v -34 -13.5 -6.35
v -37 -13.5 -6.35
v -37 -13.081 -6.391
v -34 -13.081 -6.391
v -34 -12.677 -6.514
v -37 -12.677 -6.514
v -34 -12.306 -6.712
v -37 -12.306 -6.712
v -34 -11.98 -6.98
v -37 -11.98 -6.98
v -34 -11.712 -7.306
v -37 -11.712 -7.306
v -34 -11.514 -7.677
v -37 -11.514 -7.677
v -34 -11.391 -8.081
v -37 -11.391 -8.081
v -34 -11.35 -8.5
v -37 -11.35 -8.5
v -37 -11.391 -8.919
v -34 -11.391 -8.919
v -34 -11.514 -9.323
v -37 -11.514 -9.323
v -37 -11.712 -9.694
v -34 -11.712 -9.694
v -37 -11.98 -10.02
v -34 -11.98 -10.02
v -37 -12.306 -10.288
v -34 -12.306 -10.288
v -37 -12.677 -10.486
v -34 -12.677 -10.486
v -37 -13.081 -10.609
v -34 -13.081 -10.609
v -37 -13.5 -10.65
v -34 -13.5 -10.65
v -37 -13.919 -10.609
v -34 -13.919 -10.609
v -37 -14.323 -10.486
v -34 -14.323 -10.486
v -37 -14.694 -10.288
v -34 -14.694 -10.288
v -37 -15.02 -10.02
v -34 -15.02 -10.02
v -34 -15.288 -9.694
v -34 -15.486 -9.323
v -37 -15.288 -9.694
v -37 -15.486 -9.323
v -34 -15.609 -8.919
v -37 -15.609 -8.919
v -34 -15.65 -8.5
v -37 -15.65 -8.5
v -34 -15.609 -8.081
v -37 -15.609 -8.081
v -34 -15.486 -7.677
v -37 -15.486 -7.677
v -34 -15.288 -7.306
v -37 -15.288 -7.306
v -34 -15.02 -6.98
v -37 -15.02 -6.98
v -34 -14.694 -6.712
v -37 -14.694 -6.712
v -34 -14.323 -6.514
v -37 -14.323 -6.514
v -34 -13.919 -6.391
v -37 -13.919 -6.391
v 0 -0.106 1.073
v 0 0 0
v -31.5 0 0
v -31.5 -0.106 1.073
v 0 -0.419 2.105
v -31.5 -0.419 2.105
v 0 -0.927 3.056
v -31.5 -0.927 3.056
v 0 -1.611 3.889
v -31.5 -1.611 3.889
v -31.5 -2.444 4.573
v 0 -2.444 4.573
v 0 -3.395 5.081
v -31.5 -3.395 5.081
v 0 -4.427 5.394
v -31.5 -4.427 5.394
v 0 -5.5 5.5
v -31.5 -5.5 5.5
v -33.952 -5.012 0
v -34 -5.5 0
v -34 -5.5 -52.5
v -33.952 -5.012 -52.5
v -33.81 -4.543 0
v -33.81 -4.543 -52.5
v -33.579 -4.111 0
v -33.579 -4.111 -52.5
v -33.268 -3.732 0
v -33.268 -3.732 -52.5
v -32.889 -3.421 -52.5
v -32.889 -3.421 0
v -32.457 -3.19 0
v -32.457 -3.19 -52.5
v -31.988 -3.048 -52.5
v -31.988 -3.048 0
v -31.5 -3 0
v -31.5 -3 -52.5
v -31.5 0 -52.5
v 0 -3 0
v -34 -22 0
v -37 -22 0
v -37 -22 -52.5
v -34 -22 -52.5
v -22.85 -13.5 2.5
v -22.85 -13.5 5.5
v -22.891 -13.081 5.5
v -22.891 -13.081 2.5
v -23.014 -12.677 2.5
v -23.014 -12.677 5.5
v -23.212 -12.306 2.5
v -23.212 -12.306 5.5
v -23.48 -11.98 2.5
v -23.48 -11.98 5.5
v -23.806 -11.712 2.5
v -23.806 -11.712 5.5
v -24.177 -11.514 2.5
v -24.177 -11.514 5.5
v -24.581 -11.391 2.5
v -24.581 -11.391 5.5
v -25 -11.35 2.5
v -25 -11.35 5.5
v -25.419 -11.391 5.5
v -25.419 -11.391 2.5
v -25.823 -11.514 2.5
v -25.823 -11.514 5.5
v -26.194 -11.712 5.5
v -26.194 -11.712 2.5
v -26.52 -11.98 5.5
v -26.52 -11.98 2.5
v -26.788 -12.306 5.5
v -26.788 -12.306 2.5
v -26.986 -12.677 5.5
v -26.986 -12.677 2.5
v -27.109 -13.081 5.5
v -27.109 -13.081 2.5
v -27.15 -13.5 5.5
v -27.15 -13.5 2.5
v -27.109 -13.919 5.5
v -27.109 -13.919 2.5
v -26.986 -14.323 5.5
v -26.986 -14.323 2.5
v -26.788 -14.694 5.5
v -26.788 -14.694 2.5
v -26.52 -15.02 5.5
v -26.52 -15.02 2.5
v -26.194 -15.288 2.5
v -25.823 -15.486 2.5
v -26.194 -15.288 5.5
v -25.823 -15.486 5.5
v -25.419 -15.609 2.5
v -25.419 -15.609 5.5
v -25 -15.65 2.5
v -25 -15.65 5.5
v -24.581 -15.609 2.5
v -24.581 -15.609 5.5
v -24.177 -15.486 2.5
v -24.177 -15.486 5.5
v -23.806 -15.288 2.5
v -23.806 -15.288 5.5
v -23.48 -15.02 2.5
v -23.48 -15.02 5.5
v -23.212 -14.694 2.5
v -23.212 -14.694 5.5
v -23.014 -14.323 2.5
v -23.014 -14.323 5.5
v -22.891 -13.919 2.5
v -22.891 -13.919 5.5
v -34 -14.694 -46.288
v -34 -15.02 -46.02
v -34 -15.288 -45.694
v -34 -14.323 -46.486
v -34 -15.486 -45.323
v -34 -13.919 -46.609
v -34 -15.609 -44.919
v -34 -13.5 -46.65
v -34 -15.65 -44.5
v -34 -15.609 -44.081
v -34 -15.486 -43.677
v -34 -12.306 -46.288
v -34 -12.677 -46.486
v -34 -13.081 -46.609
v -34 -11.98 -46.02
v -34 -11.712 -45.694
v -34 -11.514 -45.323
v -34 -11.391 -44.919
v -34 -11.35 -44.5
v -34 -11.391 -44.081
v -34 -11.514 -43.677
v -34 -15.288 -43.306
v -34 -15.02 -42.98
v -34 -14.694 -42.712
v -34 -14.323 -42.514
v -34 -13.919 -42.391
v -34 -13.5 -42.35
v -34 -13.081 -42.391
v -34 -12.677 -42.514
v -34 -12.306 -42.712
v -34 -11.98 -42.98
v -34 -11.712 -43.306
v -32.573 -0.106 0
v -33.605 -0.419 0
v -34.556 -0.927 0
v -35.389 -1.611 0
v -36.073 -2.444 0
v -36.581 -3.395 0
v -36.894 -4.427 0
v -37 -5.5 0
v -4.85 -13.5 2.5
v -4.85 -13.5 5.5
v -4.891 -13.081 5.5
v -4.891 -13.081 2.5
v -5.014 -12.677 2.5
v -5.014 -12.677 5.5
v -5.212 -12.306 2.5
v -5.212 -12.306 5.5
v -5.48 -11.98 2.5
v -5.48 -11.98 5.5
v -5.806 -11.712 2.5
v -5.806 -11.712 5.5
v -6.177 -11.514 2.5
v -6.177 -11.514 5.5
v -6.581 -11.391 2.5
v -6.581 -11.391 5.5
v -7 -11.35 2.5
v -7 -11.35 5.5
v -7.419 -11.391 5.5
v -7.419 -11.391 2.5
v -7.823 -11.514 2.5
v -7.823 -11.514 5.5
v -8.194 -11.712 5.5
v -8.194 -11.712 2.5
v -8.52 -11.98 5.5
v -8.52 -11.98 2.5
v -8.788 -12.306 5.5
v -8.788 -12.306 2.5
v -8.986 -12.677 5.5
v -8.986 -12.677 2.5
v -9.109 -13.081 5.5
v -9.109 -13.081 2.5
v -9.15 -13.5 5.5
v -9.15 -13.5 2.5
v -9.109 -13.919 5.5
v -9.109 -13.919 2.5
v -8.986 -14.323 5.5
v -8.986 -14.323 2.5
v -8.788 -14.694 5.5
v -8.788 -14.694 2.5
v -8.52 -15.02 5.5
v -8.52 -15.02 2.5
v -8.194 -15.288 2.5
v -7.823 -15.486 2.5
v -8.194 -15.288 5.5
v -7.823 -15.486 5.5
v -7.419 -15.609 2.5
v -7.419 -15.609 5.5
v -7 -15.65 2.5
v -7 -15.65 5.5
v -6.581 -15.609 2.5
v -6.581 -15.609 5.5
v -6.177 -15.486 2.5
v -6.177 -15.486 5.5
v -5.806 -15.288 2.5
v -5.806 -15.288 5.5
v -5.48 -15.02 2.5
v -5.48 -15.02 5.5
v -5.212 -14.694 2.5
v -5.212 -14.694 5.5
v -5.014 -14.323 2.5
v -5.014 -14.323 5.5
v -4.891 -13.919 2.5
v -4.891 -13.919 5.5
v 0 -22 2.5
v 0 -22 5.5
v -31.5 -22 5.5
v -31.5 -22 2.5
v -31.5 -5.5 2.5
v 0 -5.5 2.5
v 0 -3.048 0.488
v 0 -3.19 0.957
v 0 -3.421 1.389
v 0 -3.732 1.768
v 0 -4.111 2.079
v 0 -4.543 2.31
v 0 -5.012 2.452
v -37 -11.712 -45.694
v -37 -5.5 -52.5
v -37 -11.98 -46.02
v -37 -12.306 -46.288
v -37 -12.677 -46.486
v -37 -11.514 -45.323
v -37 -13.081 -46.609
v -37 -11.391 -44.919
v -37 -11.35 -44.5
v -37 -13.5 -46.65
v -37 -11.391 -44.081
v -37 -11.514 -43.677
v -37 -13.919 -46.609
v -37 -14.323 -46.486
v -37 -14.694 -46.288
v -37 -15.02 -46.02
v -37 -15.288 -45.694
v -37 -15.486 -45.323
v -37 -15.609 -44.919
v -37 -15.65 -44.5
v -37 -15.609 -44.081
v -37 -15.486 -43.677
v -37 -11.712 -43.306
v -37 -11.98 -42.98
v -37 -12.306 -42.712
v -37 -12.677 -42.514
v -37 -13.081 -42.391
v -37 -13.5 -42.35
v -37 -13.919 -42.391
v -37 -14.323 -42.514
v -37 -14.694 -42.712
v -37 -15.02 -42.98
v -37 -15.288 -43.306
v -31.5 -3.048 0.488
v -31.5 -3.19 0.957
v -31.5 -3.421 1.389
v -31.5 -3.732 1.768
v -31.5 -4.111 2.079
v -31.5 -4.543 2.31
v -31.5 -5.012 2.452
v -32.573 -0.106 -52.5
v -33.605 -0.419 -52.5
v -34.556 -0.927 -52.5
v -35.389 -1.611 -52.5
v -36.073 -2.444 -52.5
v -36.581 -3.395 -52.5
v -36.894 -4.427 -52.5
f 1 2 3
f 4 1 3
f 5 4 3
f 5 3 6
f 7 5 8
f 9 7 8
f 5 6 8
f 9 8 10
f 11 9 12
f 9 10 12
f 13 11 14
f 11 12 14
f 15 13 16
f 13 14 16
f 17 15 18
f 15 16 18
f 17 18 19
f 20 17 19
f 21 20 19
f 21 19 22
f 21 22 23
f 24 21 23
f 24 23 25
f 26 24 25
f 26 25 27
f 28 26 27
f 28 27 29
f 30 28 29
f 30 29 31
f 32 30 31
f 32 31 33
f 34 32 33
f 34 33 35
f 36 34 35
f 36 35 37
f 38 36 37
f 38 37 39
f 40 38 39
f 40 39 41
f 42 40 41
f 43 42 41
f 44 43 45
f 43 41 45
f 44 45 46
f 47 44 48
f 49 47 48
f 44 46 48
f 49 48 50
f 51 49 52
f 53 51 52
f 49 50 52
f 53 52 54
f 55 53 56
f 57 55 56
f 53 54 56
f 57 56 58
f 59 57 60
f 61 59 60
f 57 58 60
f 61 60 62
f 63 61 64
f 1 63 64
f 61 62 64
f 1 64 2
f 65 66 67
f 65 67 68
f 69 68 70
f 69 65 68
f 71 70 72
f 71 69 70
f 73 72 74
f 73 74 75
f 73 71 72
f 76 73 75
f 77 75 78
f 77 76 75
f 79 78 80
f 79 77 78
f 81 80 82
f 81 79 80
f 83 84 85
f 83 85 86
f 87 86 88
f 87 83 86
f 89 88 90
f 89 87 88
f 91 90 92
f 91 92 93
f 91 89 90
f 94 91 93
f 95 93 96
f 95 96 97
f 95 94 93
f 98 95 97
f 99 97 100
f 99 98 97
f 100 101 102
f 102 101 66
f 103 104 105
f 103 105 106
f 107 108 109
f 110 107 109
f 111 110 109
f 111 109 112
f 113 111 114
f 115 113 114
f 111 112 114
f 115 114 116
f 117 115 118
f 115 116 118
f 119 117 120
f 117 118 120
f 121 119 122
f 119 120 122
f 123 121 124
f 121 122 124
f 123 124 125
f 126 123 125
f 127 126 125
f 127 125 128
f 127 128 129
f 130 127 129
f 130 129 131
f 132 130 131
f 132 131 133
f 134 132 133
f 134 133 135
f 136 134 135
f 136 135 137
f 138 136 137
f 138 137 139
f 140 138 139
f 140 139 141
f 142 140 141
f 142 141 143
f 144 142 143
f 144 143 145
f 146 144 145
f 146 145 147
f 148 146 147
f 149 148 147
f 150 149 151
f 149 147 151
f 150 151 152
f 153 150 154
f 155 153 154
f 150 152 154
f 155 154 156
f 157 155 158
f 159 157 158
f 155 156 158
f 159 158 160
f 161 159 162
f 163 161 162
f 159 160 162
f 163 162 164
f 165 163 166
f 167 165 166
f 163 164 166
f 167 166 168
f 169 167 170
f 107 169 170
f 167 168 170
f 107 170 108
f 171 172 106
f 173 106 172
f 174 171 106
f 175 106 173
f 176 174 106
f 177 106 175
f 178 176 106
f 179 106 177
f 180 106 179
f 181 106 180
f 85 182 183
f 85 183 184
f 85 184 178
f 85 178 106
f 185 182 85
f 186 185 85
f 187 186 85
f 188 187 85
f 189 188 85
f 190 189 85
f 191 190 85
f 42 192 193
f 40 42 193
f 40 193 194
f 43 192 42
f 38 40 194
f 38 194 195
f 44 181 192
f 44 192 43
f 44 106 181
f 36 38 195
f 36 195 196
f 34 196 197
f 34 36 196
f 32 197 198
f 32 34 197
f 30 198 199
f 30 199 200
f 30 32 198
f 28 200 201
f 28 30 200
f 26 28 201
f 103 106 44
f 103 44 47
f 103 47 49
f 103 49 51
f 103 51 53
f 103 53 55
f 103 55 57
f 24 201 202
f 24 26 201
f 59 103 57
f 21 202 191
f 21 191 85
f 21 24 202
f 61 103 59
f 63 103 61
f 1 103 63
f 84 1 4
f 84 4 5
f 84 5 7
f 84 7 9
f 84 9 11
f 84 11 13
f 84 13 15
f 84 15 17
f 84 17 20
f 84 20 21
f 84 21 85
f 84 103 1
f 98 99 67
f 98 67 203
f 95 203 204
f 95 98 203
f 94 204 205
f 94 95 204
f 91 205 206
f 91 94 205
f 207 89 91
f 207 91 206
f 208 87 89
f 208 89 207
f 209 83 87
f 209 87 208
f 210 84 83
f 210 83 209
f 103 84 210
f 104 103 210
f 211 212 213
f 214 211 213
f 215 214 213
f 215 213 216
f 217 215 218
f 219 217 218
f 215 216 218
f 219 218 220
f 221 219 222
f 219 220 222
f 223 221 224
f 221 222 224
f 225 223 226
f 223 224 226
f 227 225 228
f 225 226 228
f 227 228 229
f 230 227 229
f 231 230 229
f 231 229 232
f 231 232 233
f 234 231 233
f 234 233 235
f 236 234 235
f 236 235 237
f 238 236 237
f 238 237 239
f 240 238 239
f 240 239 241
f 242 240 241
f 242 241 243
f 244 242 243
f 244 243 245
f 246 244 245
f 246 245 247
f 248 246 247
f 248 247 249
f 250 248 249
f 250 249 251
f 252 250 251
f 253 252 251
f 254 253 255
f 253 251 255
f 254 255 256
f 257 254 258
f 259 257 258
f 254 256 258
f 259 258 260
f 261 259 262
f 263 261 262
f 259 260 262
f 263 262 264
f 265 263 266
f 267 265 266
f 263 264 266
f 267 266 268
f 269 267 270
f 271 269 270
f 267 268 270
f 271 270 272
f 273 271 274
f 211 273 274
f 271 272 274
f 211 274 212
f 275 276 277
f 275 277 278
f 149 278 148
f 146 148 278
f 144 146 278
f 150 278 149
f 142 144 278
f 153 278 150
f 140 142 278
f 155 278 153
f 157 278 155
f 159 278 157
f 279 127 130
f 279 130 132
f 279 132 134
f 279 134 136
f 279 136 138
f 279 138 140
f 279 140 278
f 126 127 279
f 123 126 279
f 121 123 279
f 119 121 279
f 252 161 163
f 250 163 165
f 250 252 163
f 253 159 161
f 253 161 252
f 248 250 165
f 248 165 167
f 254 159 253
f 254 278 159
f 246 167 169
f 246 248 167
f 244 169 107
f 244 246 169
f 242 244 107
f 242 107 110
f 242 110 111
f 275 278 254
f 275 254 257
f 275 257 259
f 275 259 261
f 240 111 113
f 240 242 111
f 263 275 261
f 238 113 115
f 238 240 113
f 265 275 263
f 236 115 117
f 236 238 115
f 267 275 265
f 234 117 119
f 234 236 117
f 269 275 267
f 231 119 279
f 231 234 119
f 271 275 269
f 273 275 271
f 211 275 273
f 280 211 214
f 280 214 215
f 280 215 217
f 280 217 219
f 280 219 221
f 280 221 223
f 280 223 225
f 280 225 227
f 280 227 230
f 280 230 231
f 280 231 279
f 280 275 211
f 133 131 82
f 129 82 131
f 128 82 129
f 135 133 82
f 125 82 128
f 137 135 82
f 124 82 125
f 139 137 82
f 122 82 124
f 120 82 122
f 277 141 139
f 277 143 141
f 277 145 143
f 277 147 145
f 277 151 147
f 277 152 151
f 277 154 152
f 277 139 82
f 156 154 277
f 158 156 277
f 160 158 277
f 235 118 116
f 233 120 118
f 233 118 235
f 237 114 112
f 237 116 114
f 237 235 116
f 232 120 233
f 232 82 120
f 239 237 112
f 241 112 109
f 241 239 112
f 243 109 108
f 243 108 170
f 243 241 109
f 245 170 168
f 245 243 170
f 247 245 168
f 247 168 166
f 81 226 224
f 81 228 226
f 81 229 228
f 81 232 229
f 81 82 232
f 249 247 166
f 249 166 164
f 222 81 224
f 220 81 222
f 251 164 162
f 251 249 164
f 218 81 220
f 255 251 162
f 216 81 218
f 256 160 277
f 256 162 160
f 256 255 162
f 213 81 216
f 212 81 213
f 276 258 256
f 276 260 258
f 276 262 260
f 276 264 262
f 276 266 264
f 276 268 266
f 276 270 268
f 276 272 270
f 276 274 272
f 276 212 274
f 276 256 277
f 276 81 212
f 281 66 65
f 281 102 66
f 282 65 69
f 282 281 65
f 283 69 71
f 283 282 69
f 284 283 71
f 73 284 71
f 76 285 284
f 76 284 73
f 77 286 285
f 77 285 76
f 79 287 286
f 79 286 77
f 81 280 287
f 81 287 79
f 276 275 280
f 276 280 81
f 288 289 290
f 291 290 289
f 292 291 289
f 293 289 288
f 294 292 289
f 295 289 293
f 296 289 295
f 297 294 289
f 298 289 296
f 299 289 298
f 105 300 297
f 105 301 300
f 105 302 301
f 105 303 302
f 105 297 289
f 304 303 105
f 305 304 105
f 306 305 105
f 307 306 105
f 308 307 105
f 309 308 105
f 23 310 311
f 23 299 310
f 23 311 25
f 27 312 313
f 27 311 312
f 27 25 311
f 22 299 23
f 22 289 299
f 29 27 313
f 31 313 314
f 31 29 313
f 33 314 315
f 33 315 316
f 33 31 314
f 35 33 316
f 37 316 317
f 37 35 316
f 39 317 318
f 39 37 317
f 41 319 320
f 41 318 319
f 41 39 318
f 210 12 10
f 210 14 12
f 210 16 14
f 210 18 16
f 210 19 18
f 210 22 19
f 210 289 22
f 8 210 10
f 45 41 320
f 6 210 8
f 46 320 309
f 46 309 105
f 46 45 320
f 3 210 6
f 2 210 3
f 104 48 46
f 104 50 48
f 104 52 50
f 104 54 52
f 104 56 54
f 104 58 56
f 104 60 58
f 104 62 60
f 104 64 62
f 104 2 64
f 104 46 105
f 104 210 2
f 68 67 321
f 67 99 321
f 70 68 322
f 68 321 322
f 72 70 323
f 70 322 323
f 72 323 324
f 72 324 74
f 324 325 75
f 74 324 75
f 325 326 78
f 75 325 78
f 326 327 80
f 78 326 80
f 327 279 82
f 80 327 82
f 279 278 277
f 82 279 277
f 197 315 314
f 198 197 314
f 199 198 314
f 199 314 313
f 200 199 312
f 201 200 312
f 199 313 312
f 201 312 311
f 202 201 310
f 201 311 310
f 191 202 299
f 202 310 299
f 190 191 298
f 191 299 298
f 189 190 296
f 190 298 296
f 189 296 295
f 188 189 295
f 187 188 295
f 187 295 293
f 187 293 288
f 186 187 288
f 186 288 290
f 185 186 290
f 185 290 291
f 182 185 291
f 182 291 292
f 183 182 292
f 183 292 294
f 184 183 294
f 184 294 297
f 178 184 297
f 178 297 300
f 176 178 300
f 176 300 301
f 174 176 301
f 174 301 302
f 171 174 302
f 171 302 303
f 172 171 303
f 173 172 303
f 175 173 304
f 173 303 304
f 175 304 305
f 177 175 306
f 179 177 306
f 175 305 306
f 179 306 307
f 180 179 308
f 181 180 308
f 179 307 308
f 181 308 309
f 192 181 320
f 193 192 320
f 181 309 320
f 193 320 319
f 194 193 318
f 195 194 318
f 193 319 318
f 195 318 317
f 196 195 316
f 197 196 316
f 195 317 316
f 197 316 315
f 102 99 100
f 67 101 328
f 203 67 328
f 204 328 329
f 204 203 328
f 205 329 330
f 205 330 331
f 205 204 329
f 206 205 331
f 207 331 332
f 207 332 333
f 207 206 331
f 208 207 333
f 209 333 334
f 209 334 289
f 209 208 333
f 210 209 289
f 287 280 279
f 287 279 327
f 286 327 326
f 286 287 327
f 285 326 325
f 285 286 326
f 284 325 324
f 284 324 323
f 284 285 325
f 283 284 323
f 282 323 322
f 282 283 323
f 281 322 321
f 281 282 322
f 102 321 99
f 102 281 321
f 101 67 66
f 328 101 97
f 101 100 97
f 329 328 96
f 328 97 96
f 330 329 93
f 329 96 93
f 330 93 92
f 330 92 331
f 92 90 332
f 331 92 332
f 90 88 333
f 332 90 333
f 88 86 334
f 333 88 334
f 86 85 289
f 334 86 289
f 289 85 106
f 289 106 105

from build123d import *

# Parameters (mm, degrees)
SKETCH1_W            = 31.5
SKETCH1_H            = 52.5
BASE_FLANGE1_DEPTH   = 3
EDGE_FLANGE1_DEPTH   = 31.5
EDGE_FLANGE2_DEPTH   = 52.5
CUT_EXTRUDE1_DEPTH   = 10
M4_CLEARANCE_HOLE1_D = 4.3
M4_CLEARANCE_HOLE2_D = 4.3


# Sheet-metal steps are written as plain solids
with BuildPart() as part:
    # Sketch1 → Base-Flange1 (new body)
    with BuildSketch(Plane(origin=(0, 0, 0), x_dir=(1, 0, 0), z_dir=(0, 1, 0))):
        with Locations((-15.75, 26.25)):
            Rectangle(SKETCH1_W, SKETCH1_H)
    extrude(amount=-BASE_FLANGE1_DEPTH)

    # Edge-Flange1 section (across the edge) → Edge-Flange1 (add)
    with BuildSketch(Plane(origin=(0, -3, 2.5), x_dir=(0, 0, -1), z_dir=(-1, 0, 0))):
        with BuildLine():
            Line((-3, 2.5), (-3, 19))
            Line((-3, 19), (0, 19))
            Line((0, 19), (0, 2.5))
            ThreePointArc((0, 2.5), (0.732233047, 0.732233047), (2.5, 0))
            Line((2.5, 0), (2.5, -3))
            ThreePointArc((2.5, -3), (-1.389087297, -1.389087297), (-3, 2.5))
        make_face()
    extrude(amount=EDGE_FLANGE1_DEPTH)

    # Edge-Flange2 section (across the edge) → Edge-Flange2 (add)
    with BuildSketch(Plane(origin=(-34, -3, 0), x_dir=(1, 0, 0), z_dir=(0, 0, -1))):
        with BuildLine():
            Line((-3, 2.5), (-3, 19))
            Line((-3, 19), (0, 19))
            Line((0, 19), (0, 2.5))
            ThreePointArc((0, 2.5), (0.732233047, 0.732233047), (2.5, 0))
            Line((2.5, 0), (2.5, -3))
            ThreePointArc((2.5, -3), (-1.389087297, -1.389087297), (-3, 2.5))
        make_face()
    extrude(amount=EDGE_FLANGE2_DEPTH)

    # Sketch12 → Cut-Extrude1 (cut)
    with BuildSketch(Plane(origin=(0, 0, 0), x_dir=(1, 0, 0), z_dir=(0, 1, 0))):
        Polygon((-31.5, 52.5), (0, 0), (0, 52.5), align=None)
    extrude(amount=-CUT_EXTRUDE1_DEPTH, mode=Mode.SUBTRACT)

    # M4 Clearance Hole1 (through all)
    with Locations(Plane(origin=(0, 0, 2.5), x_dir=(-1, 0, 0), z_dir=(0, 0, -1))):
        with Locations((7, -13.5), (25, -13.5)):
            Hole(M4_CLEARANCE_HOLE1_D / 2)

    # M4 Clearance Hole2 (through all)
    with Locations(Plane(origin=(-34, 0, 0), x_dir=(0, 0, -1), z_dir=(1, 0, 0))):
        with Locations((44.5, -13.5), (8.5, -13.5)):
            Hole(M4_CLEARANCE_HOLE2_D / 2)


solid = part.part
